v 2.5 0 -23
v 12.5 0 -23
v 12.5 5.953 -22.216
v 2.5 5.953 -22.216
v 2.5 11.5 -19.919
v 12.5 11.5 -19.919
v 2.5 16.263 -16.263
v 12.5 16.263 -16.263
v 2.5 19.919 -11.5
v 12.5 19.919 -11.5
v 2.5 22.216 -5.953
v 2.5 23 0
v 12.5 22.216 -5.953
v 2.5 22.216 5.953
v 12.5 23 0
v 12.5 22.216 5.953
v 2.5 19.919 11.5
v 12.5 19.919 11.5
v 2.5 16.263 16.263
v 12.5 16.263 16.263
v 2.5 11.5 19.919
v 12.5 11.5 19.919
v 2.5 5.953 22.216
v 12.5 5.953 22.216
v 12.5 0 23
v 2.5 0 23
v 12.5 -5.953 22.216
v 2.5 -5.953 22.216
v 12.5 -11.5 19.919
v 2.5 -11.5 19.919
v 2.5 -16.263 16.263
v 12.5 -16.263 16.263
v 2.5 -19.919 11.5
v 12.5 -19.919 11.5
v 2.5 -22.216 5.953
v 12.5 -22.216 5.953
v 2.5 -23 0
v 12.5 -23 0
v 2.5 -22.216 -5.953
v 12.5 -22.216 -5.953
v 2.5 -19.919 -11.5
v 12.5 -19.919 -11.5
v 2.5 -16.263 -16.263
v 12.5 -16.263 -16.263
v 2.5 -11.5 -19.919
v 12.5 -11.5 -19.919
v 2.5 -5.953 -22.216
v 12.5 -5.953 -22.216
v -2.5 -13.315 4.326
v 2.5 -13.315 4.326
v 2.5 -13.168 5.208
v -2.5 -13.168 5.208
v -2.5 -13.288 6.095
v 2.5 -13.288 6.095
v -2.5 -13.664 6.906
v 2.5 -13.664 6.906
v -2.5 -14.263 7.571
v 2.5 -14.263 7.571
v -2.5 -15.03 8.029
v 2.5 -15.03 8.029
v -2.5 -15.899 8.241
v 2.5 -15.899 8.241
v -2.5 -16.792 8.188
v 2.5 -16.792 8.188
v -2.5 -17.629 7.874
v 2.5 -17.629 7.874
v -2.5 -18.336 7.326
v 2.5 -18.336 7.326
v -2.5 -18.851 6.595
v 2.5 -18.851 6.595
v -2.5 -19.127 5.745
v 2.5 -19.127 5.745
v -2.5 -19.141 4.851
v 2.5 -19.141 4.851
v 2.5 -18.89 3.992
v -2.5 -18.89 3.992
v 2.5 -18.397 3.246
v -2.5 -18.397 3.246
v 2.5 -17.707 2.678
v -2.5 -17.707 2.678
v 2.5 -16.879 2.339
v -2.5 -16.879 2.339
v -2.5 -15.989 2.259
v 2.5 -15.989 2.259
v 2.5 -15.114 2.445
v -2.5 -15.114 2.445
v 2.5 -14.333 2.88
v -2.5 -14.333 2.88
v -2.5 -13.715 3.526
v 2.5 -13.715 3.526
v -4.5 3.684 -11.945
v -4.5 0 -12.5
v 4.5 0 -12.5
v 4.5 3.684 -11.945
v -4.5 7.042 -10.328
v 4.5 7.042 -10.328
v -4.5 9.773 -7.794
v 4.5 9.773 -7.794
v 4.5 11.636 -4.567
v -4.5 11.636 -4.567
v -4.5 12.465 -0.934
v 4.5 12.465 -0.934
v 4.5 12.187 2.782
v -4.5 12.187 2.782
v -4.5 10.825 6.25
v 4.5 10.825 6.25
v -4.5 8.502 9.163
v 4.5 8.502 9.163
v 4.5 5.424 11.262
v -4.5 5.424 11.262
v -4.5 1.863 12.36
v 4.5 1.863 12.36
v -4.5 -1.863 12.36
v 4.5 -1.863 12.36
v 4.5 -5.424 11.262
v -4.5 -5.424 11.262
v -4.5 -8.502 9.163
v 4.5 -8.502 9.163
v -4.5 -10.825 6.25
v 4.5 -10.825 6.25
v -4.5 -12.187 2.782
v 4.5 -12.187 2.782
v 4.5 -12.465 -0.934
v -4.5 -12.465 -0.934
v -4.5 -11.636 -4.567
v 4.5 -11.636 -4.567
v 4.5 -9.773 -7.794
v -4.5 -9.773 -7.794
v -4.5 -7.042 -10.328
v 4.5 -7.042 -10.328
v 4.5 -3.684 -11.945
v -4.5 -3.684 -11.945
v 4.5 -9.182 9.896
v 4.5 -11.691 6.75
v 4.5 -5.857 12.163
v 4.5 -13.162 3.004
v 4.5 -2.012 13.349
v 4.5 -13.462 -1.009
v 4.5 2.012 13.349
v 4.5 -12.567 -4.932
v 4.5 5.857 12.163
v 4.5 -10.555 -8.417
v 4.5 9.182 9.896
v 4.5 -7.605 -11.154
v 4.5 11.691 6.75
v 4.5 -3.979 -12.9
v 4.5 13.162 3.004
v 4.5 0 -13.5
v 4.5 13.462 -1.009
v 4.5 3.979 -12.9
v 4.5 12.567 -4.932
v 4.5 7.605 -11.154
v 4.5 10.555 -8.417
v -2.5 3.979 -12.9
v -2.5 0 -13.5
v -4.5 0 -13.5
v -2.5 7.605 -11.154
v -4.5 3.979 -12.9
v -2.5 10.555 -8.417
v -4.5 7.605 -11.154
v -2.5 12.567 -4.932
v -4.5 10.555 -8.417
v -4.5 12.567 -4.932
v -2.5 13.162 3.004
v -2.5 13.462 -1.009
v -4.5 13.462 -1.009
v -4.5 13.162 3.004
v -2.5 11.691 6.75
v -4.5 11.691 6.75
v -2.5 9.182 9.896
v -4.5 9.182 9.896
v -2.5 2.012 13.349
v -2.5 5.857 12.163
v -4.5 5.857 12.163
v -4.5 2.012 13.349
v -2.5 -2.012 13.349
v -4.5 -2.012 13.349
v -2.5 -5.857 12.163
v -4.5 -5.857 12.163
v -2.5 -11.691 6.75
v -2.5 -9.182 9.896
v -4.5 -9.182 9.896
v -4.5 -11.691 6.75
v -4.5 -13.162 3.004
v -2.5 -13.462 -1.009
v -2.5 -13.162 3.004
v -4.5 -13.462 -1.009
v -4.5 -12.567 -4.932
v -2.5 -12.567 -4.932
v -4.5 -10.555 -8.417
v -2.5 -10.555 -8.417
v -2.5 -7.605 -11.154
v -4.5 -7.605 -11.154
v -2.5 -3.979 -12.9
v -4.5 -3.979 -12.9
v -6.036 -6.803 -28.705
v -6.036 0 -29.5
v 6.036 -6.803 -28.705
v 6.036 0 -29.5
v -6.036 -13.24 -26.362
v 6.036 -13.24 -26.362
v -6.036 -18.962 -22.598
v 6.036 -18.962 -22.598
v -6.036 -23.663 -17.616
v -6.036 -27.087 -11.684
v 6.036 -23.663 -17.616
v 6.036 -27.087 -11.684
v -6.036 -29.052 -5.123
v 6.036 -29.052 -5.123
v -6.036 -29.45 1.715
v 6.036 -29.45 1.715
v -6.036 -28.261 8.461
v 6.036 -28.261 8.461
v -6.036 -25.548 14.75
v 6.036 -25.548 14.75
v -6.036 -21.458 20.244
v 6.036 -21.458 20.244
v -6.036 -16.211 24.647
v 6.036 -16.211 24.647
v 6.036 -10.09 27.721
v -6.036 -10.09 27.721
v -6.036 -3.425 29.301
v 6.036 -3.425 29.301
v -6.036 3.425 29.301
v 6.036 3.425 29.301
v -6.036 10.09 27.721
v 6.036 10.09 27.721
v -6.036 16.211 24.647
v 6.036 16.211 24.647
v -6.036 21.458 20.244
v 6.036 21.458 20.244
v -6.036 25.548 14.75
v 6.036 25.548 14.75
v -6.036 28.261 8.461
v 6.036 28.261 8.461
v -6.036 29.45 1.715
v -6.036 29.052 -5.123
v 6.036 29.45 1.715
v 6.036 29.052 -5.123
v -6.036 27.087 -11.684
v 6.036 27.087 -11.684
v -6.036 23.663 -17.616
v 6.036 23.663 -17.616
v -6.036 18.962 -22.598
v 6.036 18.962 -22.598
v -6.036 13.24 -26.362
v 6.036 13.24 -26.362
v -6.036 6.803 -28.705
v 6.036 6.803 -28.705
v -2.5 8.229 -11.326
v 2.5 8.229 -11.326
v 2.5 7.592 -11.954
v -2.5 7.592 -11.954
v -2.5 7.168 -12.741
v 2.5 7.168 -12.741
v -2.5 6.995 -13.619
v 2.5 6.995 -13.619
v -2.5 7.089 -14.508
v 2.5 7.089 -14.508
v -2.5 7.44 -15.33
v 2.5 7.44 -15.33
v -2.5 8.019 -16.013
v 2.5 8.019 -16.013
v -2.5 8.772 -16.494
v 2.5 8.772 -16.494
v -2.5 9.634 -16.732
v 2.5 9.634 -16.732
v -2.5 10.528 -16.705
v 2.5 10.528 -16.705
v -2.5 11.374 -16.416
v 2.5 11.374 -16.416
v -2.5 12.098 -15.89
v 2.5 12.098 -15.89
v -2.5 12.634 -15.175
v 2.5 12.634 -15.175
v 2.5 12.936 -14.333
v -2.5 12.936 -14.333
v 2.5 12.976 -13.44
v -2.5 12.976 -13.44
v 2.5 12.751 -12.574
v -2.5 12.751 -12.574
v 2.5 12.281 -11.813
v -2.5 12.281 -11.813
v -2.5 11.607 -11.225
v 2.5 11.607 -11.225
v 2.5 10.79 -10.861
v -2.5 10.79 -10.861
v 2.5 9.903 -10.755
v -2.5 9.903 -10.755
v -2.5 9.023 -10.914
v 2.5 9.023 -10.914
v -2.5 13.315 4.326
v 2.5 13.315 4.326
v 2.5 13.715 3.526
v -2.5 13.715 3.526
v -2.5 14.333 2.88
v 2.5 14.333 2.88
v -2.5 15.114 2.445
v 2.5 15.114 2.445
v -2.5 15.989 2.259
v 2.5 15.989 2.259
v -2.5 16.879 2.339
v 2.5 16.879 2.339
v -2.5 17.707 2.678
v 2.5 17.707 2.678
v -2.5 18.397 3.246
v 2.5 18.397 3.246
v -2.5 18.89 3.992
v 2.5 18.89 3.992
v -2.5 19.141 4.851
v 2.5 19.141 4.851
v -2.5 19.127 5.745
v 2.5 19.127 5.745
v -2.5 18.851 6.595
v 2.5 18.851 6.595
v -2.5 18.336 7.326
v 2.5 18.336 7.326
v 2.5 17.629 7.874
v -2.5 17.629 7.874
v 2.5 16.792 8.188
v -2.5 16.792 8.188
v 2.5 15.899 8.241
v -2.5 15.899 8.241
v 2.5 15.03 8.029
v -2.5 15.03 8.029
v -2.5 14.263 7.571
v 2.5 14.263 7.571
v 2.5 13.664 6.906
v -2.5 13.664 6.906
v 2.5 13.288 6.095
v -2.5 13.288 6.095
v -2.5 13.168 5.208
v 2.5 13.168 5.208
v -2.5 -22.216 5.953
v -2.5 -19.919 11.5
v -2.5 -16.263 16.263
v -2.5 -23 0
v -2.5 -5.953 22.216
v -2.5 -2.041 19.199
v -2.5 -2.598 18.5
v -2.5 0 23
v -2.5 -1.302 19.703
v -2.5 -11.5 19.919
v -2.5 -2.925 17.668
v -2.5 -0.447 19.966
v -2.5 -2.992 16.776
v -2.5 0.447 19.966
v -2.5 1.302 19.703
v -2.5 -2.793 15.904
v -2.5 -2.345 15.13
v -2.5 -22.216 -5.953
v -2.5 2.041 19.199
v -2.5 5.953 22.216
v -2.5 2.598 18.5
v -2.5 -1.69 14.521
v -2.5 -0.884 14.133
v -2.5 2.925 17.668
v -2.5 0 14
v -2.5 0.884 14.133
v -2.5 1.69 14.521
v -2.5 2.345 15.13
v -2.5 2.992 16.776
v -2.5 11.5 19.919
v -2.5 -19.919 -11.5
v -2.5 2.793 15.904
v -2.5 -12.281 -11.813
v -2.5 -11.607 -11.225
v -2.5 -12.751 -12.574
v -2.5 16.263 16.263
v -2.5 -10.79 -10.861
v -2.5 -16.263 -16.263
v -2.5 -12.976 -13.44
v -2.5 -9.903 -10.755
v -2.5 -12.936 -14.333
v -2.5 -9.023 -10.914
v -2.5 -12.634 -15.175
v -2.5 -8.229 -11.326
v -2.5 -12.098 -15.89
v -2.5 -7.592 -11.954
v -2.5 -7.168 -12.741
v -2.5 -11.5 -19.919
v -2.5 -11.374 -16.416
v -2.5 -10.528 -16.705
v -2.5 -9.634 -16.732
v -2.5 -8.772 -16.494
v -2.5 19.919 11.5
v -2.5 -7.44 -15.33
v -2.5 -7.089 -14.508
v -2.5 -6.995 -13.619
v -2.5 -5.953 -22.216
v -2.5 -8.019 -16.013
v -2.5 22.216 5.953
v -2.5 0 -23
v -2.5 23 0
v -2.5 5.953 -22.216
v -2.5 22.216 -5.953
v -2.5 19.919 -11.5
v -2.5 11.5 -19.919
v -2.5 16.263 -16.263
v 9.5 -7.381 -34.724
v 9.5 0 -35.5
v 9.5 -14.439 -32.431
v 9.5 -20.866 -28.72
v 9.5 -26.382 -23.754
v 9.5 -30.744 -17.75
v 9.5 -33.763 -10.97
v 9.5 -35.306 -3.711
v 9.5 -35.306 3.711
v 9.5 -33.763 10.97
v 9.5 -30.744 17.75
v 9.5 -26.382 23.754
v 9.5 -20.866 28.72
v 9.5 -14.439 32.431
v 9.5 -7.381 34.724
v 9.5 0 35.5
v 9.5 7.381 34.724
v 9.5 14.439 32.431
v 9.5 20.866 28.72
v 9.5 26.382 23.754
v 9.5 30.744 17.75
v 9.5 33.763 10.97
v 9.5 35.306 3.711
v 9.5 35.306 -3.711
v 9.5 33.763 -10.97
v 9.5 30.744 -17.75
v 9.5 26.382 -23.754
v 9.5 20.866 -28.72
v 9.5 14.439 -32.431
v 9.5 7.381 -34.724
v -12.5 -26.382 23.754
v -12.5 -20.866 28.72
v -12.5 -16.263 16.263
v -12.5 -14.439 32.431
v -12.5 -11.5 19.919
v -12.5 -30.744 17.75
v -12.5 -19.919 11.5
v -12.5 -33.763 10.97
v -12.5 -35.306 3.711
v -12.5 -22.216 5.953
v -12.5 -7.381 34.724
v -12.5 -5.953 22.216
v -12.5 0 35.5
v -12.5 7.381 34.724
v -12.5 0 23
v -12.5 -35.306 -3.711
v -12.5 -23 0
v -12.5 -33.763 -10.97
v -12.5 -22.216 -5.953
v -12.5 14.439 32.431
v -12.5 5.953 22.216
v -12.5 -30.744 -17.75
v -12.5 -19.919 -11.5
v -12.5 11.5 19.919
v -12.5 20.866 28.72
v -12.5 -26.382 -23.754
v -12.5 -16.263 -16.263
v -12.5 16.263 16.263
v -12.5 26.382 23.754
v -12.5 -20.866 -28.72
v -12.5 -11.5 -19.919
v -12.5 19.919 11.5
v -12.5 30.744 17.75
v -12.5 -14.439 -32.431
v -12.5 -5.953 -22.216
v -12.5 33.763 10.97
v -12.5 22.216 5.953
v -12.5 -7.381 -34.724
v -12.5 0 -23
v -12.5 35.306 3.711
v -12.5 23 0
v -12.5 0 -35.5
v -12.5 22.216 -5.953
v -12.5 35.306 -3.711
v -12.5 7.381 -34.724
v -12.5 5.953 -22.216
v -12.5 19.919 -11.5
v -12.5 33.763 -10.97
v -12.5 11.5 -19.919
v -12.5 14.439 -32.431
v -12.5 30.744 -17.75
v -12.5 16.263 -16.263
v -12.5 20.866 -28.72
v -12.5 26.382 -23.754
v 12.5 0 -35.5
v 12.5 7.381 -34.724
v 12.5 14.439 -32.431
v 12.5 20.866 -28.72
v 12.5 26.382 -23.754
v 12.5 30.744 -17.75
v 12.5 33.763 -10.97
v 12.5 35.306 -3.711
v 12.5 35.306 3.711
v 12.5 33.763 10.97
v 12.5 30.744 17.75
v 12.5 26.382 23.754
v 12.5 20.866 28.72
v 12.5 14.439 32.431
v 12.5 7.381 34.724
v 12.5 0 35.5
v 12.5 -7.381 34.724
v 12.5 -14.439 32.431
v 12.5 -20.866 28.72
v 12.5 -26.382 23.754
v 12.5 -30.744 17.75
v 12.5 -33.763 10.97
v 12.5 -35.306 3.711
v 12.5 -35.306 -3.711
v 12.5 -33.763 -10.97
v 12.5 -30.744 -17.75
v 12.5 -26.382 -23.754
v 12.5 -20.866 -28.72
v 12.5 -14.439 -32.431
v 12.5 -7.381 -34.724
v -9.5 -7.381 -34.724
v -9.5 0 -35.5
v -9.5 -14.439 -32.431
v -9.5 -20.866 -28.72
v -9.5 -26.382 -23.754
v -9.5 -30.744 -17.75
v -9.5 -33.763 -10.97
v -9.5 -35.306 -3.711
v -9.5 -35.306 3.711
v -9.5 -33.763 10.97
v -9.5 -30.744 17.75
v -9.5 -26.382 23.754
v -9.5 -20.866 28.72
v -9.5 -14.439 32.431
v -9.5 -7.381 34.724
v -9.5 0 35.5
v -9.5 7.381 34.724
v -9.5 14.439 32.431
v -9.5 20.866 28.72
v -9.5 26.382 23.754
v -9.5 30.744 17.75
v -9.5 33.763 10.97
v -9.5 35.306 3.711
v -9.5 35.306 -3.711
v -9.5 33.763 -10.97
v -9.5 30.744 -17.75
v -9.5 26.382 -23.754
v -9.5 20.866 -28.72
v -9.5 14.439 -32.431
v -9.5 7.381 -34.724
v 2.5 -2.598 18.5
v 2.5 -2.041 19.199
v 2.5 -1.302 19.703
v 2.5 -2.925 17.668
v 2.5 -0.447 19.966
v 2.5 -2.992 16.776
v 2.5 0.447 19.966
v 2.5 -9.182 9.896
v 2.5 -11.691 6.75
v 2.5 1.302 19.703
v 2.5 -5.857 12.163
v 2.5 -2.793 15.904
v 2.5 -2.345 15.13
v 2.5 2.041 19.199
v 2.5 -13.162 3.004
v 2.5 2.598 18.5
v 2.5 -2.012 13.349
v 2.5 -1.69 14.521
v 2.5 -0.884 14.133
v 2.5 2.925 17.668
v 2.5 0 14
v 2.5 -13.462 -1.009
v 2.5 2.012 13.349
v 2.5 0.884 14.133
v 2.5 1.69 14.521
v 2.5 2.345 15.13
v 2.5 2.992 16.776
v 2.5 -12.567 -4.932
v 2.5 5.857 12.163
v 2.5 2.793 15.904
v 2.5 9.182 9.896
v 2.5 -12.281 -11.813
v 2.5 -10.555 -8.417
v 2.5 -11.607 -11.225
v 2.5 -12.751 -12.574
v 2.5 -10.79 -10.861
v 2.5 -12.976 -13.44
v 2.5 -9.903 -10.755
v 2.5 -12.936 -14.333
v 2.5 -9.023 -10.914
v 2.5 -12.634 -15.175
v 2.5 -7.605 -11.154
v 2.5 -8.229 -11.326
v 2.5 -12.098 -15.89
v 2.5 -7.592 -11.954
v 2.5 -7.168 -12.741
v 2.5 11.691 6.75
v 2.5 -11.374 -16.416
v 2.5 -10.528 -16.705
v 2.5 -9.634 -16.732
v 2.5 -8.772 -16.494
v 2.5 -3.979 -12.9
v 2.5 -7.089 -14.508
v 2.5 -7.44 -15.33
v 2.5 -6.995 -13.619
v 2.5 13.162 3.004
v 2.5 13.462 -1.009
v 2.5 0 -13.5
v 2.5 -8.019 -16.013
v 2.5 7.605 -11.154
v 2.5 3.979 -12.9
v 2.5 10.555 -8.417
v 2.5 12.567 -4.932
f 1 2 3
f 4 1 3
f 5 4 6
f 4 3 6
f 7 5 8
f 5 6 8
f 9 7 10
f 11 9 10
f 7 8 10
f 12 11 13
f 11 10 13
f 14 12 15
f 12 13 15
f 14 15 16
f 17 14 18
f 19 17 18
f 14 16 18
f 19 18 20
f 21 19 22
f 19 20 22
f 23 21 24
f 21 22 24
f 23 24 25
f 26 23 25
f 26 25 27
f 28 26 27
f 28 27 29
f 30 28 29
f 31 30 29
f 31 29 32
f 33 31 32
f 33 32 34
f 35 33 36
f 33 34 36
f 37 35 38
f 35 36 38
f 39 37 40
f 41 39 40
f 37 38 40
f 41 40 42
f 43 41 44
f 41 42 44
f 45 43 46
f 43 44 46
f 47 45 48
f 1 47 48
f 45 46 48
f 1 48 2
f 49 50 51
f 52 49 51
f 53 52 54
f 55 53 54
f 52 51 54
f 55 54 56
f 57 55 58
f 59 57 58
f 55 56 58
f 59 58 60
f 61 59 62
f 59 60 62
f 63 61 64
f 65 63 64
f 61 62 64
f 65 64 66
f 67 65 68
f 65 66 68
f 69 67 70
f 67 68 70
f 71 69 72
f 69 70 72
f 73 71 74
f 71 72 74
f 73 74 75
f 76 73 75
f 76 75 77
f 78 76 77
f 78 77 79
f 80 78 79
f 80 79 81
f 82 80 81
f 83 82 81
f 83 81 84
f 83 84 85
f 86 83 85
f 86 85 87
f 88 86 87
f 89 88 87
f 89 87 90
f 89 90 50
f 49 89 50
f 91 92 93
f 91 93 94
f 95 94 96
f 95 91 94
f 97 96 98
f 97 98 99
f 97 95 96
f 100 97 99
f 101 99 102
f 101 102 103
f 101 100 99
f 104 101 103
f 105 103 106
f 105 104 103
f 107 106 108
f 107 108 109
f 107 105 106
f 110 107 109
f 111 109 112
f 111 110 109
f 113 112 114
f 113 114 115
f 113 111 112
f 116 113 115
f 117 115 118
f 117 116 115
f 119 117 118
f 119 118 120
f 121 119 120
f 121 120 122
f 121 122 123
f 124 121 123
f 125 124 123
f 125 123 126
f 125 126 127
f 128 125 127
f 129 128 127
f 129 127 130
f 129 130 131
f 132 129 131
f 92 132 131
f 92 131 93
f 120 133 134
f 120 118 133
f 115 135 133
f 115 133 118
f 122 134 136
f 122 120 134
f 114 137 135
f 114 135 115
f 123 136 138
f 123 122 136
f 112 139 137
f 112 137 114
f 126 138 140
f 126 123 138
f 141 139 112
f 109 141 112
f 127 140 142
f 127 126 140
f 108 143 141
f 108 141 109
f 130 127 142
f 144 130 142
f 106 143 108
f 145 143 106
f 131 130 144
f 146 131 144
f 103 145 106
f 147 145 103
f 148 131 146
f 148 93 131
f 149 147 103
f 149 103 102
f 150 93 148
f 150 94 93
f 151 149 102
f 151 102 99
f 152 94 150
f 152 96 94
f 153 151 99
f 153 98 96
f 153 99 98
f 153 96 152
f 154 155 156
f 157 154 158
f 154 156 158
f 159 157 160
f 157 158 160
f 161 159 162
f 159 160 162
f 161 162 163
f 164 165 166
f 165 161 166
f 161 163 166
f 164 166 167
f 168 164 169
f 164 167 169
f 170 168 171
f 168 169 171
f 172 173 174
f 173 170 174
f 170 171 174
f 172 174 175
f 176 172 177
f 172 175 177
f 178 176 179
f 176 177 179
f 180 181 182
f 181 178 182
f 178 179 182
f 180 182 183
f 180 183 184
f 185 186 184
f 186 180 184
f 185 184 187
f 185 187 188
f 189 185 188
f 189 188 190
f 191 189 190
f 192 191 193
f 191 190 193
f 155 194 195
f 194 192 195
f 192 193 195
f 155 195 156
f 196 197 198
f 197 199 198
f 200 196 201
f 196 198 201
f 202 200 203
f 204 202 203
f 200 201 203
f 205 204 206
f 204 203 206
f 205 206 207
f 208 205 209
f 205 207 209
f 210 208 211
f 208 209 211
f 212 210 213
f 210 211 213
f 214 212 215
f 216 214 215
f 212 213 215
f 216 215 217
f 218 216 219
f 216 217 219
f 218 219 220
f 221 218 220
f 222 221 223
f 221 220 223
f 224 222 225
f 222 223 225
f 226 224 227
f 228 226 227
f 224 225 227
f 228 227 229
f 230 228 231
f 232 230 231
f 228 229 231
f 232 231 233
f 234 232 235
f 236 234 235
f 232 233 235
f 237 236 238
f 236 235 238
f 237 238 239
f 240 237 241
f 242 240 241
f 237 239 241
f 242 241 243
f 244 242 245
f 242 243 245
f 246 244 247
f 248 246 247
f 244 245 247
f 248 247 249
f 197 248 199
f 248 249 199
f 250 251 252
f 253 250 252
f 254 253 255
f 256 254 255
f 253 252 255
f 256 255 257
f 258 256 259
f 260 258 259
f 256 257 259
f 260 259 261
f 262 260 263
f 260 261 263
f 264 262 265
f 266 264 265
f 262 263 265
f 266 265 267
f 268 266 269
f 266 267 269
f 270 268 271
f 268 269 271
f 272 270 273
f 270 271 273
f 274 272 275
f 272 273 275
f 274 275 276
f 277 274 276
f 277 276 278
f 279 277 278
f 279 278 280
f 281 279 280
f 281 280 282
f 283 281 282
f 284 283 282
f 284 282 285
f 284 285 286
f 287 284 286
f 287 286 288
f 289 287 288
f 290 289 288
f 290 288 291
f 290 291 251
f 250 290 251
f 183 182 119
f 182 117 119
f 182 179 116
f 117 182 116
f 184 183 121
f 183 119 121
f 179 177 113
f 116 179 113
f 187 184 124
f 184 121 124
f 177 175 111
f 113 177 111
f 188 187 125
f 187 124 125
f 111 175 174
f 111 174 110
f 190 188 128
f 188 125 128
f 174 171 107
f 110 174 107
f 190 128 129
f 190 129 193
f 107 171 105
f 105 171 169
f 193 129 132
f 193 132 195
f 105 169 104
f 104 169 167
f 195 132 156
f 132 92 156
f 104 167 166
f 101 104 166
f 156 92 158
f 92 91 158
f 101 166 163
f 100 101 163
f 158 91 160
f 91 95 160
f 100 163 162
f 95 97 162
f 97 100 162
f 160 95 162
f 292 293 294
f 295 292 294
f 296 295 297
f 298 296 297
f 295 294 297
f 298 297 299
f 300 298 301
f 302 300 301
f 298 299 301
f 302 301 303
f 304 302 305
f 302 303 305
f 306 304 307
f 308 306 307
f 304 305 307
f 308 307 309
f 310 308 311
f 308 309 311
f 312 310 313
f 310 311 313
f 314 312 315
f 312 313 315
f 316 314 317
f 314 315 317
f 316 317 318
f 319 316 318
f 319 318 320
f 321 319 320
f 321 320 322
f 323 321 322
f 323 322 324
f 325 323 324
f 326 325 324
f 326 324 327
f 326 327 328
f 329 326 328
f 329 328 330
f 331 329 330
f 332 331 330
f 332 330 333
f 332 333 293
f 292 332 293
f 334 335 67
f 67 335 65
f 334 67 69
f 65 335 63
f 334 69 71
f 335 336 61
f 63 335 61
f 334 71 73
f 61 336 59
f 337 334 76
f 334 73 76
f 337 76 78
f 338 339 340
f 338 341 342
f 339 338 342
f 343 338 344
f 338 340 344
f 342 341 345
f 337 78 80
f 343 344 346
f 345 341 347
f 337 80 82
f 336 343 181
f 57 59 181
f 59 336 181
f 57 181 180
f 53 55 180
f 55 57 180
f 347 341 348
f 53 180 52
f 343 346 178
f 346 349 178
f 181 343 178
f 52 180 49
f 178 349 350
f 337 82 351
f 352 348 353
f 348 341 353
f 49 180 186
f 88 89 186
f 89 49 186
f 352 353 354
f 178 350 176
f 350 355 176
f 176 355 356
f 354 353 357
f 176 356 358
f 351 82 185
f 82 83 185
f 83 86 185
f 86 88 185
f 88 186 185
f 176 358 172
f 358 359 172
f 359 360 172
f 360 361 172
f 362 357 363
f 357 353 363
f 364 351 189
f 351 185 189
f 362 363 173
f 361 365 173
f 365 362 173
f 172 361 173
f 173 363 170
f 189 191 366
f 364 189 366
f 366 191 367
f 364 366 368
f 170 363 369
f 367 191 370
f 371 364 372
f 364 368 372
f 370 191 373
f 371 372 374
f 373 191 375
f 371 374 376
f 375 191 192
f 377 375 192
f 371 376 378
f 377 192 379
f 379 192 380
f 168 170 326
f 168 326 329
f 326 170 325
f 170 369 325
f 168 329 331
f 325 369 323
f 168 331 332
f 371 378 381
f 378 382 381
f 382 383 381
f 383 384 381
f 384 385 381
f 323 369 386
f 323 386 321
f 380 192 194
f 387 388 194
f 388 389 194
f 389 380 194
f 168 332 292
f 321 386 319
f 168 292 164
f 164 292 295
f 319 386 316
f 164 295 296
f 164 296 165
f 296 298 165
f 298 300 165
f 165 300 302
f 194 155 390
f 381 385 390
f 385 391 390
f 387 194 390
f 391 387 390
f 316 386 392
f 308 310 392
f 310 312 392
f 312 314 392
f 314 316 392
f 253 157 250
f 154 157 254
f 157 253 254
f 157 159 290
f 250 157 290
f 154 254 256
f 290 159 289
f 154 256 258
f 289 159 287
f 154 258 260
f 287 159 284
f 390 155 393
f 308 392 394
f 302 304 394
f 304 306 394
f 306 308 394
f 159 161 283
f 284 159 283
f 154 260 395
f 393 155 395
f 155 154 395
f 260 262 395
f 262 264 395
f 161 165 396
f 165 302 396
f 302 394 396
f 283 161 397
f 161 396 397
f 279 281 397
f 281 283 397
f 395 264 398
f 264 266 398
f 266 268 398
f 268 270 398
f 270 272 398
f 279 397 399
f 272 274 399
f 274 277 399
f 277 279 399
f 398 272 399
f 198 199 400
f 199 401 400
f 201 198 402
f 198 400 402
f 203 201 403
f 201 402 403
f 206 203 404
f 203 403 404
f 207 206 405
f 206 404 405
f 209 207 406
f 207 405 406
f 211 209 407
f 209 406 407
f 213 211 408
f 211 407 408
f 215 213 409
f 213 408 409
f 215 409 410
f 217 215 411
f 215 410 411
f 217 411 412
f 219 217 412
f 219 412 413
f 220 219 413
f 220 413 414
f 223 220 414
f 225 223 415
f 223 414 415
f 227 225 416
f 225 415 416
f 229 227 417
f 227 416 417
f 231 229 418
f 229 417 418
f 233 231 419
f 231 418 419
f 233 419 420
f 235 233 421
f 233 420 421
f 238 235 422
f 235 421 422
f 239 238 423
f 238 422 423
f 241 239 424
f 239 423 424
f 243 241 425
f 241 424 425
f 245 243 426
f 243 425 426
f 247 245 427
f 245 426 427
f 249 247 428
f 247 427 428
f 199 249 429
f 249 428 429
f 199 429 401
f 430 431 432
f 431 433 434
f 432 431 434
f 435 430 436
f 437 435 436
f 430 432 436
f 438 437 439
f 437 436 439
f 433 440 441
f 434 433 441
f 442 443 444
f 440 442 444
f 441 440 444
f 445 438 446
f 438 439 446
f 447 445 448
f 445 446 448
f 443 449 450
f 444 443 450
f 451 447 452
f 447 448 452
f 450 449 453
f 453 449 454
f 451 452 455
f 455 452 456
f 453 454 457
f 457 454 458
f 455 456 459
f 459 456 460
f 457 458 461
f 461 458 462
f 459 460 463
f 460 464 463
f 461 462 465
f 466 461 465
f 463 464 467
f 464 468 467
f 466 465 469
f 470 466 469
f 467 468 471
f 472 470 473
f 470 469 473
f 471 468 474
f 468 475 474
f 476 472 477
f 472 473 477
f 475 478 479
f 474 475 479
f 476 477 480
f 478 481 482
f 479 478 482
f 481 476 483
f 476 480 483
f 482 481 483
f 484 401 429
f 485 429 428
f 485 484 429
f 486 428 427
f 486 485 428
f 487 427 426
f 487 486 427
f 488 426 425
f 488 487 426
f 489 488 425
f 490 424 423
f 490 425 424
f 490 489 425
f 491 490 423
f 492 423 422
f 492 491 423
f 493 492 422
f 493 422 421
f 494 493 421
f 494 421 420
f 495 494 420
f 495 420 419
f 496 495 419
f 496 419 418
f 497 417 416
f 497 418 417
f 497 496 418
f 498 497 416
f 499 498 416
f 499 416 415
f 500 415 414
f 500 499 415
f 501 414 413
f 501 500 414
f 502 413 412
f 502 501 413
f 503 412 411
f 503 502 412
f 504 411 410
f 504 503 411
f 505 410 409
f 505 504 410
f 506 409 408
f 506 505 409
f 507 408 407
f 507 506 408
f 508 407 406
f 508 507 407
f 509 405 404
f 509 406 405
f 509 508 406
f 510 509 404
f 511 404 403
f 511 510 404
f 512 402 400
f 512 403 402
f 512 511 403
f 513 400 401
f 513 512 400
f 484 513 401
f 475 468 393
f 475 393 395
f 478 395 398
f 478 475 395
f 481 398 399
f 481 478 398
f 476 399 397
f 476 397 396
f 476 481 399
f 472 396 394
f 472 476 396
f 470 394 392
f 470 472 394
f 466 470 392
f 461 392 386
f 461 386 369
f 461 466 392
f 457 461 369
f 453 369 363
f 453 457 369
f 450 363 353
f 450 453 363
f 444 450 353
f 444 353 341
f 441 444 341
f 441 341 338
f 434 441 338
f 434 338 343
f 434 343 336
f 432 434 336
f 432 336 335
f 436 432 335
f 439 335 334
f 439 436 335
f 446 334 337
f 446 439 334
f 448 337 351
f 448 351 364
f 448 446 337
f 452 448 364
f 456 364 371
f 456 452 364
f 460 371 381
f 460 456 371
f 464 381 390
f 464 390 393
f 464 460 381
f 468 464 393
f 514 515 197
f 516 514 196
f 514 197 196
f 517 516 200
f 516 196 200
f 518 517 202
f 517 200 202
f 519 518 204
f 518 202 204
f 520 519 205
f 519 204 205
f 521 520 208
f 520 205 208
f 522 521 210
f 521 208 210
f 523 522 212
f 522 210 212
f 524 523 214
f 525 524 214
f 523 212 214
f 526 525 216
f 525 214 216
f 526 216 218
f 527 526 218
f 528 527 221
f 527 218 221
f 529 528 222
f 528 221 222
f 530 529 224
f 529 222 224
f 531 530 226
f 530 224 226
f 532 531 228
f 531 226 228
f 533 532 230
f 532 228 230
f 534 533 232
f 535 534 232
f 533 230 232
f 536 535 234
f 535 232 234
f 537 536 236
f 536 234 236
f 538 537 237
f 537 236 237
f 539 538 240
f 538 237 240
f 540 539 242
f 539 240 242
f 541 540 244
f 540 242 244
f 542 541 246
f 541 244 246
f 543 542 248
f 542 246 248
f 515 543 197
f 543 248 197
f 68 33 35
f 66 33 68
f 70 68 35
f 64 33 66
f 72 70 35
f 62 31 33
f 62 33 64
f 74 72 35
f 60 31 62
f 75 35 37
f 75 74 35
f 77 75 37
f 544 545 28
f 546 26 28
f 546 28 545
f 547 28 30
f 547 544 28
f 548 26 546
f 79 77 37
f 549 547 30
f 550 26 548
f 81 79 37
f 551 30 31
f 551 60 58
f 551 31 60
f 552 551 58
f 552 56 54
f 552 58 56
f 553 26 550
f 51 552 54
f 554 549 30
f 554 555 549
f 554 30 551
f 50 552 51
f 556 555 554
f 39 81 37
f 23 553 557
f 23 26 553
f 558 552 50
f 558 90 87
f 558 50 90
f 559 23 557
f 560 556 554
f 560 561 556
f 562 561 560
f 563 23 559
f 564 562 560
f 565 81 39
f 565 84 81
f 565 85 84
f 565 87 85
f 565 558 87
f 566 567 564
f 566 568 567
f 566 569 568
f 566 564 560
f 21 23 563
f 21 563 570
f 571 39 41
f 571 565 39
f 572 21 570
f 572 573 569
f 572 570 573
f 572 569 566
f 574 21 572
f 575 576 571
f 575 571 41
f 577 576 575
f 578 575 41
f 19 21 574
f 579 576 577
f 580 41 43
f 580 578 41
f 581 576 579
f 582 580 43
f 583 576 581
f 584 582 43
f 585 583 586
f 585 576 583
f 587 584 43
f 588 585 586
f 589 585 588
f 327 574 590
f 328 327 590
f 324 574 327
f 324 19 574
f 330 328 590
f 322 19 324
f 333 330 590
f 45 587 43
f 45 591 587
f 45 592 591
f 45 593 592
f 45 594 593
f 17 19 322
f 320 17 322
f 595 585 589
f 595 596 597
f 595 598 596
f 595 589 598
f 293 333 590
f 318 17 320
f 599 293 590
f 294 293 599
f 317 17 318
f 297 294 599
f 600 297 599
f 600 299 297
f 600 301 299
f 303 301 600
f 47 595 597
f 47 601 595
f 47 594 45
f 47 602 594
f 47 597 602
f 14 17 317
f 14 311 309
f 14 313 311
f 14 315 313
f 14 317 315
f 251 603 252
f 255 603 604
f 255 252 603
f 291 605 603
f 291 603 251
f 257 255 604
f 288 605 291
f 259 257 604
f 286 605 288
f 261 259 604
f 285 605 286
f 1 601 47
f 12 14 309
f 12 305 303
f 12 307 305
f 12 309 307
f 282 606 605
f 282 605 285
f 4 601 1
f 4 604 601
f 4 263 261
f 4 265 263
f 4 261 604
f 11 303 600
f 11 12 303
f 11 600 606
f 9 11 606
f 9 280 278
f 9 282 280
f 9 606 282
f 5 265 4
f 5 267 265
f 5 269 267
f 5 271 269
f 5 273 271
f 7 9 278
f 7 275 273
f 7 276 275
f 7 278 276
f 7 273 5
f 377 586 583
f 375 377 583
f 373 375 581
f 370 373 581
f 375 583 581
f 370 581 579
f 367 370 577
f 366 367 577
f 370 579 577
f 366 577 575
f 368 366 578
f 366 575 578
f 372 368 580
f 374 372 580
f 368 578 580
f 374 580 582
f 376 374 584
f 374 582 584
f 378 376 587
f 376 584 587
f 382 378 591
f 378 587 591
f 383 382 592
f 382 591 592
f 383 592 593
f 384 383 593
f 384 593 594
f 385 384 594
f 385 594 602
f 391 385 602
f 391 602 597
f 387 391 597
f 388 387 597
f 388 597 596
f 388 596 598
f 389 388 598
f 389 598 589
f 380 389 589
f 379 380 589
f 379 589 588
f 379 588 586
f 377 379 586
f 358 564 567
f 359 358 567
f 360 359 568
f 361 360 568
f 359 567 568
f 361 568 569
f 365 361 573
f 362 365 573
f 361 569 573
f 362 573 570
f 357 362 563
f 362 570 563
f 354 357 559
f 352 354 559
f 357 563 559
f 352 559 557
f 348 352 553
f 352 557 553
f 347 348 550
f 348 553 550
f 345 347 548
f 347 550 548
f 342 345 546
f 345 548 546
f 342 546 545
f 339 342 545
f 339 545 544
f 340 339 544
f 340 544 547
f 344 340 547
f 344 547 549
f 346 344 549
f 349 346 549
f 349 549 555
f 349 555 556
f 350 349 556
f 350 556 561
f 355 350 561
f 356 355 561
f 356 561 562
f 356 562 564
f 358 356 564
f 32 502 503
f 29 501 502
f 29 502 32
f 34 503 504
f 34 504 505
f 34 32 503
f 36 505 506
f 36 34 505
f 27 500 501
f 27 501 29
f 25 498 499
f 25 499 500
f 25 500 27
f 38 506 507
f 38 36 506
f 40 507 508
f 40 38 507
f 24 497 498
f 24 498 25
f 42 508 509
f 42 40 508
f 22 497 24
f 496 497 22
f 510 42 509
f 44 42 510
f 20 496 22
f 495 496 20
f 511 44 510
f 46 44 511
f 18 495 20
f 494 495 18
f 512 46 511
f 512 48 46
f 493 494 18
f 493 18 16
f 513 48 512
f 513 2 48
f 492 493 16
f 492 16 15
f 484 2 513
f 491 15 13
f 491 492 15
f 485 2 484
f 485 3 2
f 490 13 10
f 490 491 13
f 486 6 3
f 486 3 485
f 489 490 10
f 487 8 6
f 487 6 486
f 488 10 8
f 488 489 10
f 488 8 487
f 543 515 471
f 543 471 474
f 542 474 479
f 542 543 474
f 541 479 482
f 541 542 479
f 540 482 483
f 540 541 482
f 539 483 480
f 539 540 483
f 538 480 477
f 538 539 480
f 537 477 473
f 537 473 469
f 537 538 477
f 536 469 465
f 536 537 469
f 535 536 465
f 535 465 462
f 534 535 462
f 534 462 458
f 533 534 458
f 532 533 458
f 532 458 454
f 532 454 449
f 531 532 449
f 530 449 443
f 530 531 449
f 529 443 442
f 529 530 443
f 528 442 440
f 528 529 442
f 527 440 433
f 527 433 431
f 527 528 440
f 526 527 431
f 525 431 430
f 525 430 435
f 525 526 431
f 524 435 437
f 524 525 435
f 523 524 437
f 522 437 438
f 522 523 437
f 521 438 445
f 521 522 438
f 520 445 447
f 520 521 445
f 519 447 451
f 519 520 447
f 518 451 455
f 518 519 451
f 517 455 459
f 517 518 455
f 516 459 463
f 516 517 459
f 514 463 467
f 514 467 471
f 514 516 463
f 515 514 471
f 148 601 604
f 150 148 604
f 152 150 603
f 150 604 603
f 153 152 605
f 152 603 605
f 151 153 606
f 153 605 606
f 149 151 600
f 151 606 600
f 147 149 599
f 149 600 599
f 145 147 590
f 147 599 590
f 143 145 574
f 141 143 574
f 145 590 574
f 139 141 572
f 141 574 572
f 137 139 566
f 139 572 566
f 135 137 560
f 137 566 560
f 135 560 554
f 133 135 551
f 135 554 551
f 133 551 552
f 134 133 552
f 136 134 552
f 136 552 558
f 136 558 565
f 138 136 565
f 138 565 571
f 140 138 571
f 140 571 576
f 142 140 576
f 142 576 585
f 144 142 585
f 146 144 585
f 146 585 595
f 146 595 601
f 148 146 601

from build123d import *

# Parameters (mm, degrees)
SKETCH2_R                = 35.5
SKETCH2_R_2              = 12.5
BOSS_EXTRUDE1_DEPTH      = 12.5
SKETCH4_R                = 23
CUT_EXTRUDE1_DEPTH       = 10
SKETCH5_R                = 3
CUT_EXTRUDE2_DEPTH       = 53.397519025
CIRPATTERN1_COUNT        = 5
BOSS_EXTRUDE2_DEPTH      = 2
BOSS_EXTRUDE2_DEPTH_BACK = 7
SKETCH6_R                = 13.5
SKETCH6_R_2              = 12.5


with BuildPart() as part:
    # Sketch2 → Boss-Extrude1 (new, symmetric)
    with BuildSketch(Plane.YZ):
        with Locations(Location((0, 0, 0), (0, 0, 270))):
            Circle(SKETCH2_R)
        with Locations(Location((0, 0, 0), (0, 0, 270))):
            Circle(SKETCH2_R_2, mode=Mode.SUBTRACT)
    extrude(amount=BOSS_EXTRUDE1_DEPTH, both=True)

    # Sketch4 → Cut-Extrude1 (cut)
    with BuildSketch(Plane.YZ.offset(12.5)):
        with Locations(Location((0, 0, 0), (0, 0, 270))):
            Circle(SKETCH4_R)
    cut_extrude1 = extrude(amount=-CUT_EXTRUDE1_DEPTH, mode=Mode.SUBTRACT)

    # Mirror1: Cut-Extrude1 across plane
    add(cut_extrude1.mirror(Plane(origin=(0, 0, 0), x_dir=(0, 0, 1), z_dir=(1, 0, 0))), mode=Mode.SUBTRACT)

    # Sketch5 → Cut-Extrude2 (cut, through all)
    with BuildSketch(Plane.YZ.offset(2.5)):
        with Locations(Location((0, 17, 0), (0, 0, 270))):
            Circle(SKETCH5_R)
    cut_extrude2 = extrude(amount=-CUT_EXTRUDE2_DEPTH, mode=Mode.SUBTRACT)

    # CirPattern1: Cut-Extrude2 ×5 about axis
    cirpattern1_axis = Axis((0, 0, 0), (1, 0, 0))
    for i in range(1, CIRPATTERN1_COUNT):
        add(cut_extrude2.rotate(cirpattern1_axis, i * 360 / CIRPATTERN1_COUNT), mode=Mode.SUBTRACT)

    # Sketch6 → Boss-Extrude2 (add, two sides: drawn at the far end of the back side and taken through both)
    with BuildSketch(Plane.YZ.offset(2.5).offset(-BOSS_EXTRUDE2_DEPTH_BACK)):
        with Locations(Location((0, 0, 0), (0, 0, 270))):
            Circle(SKETCH6_R)
        with Locations(Location((0, 0, 0), (0, 0, 270))):
            Circle(SKETCH6_R_2, mode=Mode.SUBTRACT)
    extrude(amount=BOSS_EXTRUDE2_DEPTH + BOSS_EXTRUDE2_DEPTH_BACK)

    # Sketch7 → Cut-Revolve1 (revolve, cut)
    with BuildSketch(Plane(origin=(0, 0, 0), x_dir=(0, 1, 0), z_dir=(0, 0, 1)), mode=Mode.PRIVATE) as cut_revolve1_sk:
        Polygon((-35.5, 9.5), (-29.5, 6.035898385), (-29.5, -6.035898385), (-35.5, -9.5), align=None)
    revolve(cut_revolve1_sk.sketch.rotate(Axis((0, 0, 0), (-1, 0, 0)), 270), axis=Axis((0, 0, 0), (-1, 0, 0)), mode=Mode.SUBTRACT)


solid = part.part
